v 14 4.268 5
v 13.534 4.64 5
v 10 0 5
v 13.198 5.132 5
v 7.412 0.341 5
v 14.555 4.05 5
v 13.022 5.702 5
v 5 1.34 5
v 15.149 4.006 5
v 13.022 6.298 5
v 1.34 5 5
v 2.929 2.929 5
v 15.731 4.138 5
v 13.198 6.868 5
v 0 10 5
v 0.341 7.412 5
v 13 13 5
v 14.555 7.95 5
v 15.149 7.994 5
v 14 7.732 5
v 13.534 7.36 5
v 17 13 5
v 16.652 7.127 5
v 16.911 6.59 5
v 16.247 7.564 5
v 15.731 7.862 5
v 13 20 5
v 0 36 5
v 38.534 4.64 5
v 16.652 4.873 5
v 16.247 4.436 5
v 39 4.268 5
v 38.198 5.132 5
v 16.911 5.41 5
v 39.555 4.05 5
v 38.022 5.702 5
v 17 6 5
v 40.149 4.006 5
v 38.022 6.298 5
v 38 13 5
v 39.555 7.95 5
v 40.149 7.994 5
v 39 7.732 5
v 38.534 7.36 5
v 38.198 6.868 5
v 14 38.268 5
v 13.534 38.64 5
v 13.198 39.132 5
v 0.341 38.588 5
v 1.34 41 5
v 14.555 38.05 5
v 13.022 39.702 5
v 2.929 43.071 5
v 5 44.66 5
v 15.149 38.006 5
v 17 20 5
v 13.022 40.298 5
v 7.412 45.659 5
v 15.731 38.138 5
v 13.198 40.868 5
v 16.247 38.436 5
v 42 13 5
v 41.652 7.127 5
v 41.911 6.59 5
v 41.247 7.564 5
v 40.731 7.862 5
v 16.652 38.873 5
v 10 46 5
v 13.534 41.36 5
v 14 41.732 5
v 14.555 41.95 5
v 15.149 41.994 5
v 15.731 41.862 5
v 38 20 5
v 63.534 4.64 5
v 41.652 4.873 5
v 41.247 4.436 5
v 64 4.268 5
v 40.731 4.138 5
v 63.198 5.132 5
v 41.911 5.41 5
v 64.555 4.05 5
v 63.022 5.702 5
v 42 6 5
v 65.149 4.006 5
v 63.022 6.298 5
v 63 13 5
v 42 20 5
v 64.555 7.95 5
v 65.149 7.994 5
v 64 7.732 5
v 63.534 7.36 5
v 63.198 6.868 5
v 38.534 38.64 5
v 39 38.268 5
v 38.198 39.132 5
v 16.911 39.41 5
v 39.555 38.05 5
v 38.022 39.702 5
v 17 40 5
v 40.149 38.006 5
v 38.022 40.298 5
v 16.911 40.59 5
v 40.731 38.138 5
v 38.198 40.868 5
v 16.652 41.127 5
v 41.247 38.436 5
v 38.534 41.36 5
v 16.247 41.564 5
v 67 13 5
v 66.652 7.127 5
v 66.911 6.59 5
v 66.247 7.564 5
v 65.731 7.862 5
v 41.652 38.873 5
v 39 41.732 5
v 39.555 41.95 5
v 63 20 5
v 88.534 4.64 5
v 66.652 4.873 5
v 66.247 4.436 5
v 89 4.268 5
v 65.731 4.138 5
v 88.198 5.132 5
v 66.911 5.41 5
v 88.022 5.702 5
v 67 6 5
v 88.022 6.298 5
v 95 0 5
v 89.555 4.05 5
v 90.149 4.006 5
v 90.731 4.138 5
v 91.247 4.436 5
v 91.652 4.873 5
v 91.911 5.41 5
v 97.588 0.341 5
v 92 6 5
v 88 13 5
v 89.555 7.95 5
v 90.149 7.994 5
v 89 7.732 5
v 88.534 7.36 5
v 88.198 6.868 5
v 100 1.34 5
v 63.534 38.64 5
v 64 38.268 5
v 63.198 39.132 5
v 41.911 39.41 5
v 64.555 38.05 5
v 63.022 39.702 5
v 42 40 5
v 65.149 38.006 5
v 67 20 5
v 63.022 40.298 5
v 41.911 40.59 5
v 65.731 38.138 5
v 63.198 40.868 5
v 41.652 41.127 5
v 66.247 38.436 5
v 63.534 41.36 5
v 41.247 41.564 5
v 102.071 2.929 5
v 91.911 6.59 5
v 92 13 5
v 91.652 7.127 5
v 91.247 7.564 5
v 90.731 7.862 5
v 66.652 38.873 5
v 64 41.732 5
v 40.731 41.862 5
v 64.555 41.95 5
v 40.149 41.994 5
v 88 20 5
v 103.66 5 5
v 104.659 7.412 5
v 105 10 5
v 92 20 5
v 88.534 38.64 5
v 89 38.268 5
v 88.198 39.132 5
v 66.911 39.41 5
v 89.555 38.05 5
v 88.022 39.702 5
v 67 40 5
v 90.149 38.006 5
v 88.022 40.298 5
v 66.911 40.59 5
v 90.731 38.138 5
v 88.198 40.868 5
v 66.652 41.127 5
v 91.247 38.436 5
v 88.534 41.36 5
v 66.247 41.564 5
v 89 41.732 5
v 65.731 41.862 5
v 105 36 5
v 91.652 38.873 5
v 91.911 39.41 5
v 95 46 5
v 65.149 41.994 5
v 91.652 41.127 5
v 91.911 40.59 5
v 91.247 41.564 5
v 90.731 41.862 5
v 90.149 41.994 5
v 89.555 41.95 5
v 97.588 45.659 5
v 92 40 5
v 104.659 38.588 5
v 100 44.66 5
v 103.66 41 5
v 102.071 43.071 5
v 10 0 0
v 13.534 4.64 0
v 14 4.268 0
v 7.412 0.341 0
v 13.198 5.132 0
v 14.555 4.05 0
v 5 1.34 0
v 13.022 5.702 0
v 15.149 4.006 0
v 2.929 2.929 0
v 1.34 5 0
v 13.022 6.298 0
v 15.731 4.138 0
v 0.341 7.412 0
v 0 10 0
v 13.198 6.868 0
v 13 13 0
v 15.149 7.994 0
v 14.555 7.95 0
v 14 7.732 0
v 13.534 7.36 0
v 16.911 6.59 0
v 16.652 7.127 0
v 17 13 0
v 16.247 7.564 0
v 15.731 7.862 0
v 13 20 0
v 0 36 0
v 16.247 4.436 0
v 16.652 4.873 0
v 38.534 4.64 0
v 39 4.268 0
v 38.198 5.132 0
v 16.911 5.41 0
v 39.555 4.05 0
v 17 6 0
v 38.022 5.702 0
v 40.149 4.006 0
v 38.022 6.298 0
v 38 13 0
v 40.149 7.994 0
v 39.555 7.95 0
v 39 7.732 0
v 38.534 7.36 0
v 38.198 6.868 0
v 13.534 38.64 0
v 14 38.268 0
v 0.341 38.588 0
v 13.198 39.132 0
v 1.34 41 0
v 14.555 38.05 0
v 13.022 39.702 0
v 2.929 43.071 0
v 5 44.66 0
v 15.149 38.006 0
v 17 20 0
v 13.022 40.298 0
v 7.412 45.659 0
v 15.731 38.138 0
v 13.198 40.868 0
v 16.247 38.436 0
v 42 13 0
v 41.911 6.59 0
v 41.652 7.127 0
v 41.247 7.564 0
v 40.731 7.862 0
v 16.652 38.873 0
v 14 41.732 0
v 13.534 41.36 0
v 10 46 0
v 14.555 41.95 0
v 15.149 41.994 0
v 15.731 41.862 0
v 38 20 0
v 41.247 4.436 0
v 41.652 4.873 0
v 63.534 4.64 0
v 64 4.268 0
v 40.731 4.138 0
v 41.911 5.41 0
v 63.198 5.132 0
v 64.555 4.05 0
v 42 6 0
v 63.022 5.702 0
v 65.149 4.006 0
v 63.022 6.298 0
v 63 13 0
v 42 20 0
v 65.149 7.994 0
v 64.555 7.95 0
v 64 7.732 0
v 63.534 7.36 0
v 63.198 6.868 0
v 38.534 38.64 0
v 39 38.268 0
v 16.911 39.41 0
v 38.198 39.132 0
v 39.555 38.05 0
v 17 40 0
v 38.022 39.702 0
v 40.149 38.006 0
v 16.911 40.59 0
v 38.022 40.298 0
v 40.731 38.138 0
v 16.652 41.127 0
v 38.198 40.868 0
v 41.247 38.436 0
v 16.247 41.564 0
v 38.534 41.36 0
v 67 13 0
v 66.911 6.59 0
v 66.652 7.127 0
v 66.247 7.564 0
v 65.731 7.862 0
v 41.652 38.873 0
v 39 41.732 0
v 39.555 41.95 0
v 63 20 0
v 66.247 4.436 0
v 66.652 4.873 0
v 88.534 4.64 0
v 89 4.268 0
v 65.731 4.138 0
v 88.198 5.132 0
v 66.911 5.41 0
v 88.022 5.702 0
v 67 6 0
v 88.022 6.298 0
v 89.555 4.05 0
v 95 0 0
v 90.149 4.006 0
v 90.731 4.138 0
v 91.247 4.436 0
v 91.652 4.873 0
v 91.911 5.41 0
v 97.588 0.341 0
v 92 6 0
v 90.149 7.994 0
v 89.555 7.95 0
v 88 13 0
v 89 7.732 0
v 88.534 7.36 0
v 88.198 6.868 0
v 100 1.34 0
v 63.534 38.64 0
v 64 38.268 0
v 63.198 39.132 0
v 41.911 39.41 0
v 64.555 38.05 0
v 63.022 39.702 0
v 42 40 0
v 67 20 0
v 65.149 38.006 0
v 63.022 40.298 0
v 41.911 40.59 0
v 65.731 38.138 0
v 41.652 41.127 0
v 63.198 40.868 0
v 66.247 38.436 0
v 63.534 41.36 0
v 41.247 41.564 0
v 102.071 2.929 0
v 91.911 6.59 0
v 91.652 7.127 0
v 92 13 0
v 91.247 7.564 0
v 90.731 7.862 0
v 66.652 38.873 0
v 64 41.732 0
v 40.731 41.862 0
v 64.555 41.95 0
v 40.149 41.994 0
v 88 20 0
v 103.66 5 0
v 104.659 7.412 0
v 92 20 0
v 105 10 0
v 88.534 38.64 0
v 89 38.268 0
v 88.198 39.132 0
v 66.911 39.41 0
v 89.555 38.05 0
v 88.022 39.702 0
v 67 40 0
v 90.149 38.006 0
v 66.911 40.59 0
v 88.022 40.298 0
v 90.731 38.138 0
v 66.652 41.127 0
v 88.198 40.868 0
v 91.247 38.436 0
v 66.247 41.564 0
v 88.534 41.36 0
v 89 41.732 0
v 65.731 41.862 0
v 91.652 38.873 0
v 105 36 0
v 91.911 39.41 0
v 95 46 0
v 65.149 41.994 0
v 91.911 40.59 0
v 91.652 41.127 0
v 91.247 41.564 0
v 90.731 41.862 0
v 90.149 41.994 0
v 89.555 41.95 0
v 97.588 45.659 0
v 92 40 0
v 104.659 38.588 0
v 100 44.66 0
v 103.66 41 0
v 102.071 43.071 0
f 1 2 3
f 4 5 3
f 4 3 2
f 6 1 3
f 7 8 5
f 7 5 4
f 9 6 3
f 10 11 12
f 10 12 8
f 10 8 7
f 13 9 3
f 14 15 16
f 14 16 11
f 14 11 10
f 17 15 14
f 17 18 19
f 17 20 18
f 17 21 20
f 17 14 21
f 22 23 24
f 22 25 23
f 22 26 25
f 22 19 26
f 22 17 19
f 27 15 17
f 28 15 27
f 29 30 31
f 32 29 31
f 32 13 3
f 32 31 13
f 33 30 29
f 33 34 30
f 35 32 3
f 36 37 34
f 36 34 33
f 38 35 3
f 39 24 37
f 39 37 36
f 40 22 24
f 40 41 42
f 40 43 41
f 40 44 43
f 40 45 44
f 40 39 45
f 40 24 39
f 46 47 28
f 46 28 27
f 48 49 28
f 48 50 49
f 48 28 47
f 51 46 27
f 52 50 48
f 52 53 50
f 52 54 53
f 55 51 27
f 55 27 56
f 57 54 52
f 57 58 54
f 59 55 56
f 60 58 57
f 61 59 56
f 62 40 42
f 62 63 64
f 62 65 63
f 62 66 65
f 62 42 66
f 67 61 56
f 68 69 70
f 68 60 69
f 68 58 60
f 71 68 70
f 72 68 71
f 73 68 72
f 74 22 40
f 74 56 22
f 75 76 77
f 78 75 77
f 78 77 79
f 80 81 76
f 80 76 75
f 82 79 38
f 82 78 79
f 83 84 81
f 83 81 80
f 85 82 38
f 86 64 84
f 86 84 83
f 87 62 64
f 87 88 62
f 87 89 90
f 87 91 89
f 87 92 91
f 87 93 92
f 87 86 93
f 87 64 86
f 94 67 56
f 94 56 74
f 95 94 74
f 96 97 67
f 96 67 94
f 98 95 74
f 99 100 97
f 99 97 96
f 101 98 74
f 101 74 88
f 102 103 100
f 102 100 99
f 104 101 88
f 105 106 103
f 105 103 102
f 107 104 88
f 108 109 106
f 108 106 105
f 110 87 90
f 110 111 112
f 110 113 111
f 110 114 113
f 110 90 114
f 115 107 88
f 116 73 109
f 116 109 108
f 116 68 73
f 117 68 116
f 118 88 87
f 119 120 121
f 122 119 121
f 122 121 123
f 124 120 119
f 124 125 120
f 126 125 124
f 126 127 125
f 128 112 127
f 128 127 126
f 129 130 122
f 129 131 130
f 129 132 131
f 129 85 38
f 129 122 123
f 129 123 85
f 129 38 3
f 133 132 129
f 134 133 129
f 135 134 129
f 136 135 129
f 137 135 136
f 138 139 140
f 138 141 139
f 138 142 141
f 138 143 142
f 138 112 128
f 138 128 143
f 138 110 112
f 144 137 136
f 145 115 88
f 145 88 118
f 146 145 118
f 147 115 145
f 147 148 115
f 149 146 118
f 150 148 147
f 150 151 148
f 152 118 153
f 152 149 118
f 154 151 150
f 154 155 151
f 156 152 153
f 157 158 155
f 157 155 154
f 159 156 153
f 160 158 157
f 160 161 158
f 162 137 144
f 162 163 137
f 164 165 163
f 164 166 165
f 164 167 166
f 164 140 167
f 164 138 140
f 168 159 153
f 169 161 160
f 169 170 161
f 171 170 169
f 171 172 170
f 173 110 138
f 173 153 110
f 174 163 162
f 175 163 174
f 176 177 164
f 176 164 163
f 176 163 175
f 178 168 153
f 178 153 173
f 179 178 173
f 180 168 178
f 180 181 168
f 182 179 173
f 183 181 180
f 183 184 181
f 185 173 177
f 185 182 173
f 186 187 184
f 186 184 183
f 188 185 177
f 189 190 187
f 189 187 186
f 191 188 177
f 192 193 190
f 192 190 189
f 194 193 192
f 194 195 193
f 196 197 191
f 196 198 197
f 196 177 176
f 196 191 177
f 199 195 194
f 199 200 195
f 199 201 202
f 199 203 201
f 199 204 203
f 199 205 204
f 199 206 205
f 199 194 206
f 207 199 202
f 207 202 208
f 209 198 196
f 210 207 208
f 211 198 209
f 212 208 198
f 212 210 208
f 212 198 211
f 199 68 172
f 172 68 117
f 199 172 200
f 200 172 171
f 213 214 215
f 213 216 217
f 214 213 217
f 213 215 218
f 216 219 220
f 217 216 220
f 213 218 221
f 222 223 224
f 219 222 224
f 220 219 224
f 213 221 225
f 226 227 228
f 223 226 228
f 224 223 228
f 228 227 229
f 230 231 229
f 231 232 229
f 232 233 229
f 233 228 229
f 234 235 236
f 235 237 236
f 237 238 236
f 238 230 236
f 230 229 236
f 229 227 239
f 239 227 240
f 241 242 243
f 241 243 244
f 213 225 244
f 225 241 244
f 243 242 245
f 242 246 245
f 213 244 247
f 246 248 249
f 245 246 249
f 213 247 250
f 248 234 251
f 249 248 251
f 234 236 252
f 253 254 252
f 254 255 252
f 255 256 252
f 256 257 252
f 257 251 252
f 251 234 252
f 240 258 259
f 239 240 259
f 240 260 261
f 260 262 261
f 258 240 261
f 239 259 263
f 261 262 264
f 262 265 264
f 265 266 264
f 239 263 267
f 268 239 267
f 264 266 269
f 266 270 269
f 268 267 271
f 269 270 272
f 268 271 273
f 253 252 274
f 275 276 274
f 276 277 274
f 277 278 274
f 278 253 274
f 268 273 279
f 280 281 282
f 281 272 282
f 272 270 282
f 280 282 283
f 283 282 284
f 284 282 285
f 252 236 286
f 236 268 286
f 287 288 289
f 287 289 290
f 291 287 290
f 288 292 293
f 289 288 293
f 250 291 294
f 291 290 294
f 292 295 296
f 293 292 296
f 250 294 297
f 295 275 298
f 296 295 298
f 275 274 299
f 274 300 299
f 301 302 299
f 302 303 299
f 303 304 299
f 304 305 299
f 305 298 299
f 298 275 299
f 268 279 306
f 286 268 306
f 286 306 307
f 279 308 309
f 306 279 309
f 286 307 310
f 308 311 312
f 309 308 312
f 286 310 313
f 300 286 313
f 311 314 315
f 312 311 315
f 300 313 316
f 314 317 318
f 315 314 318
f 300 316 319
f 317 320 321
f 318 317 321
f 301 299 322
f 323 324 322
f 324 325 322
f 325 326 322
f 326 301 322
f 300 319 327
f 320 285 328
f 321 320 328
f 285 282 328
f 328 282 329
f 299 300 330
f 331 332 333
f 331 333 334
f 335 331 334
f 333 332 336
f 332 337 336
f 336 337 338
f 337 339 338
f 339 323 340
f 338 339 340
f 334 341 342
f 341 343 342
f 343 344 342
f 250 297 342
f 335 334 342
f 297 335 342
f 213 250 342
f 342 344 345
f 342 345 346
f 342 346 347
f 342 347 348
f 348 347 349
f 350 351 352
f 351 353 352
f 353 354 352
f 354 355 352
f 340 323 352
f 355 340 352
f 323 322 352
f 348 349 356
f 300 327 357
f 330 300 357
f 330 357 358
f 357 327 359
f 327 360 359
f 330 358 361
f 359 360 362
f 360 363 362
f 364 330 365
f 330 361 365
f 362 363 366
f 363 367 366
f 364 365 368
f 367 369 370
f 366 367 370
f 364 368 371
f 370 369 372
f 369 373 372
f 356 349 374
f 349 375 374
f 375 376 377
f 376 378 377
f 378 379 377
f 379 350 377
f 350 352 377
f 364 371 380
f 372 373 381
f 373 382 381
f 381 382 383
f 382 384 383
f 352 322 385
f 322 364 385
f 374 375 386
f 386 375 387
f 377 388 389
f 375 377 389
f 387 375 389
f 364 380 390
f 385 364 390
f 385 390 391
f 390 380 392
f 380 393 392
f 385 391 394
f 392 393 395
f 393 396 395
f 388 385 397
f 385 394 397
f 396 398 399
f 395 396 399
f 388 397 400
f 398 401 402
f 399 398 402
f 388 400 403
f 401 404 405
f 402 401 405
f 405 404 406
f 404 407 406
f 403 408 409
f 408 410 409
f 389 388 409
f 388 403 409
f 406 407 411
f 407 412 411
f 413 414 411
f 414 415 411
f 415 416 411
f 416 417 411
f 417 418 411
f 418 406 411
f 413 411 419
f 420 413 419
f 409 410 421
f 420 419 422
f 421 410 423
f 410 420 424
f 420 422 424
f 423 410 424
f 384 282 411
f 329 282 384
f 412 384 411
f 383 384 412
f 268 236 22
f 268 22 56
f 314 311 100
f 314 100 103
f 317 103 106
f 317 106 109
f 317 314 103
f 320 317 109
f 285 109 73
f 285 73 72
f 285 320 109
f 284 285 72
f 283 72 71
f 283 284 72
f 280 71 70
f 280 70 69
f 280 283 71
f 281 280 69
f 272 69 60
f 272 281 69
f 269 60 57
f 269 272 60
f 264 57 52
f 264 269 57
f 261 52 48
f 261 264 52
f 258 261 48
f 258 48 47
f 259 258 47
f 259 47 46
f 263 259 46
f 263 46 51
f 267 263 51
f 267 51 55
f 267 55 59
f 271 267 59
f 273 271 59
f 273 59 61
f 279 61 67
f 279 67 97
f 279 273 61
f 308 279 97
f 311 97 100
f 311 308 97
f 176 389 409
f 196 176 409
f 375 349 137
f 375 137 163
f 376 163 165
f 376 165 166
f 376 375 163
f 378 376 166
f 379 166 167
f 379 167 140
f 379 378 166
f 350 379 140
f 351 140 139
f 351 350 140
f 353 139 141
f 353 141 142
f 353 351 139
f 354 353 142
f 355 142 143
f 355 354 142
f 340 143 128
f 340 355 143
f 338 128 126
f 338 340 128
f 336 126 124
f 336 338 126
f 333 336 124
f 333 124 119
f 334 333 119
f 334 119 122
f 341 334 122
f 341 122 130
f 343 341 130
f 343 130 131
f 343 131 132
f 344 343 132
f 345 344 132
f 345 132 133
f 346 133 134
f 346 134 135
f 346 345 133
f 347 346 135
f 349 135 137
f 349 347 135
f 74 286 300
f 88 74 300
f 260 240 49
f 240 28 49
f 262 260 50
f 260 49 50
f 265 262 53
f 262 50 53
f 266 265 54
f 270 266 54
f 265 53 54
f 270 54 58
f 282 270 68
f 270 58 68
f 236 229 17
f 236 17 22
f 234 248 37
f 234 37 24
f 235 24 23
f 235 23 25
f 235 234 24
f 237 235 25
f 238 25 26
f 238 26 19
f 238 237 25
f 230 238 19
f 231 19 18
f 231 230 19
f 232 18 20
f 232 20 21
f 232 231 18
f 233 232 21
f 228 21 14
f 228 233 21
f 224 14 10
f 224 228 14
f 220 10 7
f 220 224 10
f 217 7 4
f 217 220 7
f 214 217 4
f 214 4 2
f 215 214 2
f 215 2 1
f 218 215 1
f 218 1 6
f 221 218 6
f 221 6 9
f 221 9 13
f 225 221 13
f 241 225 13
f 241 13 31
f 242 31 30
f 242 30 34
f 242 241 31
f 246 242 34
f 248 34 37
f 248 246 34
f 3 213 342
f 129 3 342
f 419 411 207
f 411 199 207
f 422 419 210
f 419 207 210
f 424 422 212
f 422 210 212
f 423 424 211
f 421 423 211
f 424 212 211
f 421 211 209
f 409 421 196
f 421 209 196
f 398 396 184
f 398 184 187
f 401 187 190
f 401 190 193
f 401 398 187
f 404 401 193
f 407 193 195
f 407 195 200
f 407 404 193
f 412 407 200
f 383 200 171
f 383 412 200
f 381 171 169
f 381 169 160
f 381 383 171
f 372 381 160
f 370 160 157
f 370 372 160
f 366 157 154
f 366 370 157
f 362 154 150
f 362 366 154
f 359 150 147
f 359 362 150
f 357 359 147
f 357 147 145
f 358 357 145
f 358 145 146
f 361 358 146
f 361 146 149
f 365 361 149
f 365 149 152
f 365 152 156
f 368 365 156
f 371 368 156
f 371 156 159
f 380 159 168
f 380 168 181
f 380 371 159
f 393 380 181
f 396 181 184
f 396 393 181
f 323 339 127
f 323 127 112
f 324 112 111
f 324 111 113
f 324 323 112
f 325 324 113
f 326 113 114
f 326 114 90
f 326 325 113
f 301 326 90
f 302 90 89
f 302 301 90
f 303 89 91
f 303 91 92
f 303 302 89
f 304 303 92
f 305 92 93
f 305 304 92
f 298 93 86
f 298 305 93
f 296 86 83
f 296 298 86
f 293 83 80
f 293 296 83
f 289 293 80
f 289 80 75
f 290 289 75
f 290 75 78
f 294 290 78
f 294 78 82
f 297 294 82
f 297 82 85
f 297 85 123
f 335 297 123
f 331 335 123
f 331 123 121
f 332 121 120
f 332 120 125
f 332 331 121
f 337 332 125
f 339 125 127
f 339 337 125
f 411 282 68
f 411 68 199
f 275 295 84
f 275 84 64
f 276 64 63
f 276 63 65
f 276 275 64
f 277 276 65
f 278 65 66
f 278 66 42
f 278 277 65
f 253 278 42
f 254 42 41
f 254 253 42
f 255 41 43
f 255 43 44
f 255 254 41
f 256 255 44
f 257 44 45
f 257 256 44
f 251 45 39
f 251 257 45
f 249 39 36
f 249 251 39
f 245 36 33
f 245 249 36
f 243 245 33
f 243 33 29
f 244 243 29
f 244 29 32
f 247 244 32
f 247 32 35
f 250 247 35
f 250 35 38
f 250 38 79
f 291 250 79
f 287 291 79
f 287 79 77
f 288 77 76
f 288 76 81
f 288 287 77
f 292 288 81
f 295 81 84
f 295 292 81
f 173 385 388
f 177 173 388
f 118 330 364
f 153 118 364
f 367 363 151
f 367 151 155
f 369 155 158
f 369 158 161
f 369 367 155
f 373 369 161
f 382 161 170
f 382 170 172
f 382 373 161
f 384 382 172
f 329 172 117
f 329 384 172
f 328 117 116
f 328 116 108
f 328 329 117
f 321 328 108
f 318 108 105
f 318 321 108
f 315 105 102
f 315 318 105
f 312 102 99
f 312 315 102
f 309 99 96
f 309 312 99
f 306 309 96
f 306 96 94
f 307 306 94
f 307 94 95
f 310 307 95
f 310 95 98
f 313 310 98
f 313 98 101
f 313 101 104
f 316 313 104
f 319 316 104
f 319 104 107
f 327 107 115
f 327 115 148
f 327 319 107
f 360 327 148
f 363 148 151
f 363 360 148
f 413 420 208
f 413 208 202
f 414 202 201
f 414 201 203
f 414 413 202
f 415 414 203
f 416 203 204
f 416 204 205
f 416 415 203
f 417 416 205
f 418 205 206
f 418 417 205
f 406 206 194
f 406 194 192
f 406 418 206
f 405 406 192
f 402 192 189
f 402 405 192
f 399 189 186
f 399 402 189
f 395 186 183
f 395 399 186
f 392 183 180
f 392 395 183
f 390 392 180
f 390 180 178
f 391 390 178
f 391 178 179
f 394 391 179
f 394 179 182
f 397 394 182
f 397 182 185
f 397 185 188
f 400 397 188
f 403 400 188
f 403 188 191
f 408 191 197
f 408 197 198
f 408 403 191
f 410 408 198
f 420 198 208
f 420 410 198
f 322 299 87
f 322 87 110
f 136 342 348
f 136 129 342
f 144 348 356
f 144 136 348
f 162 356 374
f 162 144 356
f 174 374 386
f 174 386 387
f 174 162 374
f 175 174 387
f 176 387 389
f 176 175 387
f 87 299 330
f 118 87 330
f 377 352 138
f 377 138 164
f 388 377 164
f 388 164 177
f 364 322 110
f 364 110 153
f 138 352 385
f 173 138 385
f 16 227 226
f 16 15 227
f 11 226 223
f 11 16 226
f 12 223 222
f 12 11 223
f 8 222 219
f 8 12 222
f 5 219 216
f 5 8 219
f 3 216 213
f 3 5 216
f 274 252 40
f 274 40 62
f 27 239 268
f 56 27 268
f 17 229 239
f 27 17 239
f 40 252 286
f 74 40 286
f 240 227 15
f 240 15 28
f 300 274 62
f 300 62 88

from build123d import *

# Parameters (mm, degrees)
ESQUISSE1_W        = 105
ESQUISSE1_H        = 46
ESQUISSE1_R        = 2
ESQUISSE1_W_2      = 4
ESQUISSE1_H_2      = 7
BOSS_EXTRU_1_DEPTH = 5
CONG_1_R           = 10


with BuildPart() as part:
    # Esquisse1 → Boss.-Extru.1 (new body)
    with BuildSketch(Plane.XY):
        with Locations((52.5, 23)):
            Rectangle(ESQUISSE1_W, ESQUISSE1_H)
        with Locations((15, 6)):
            Circle(ESQUISSE1_R, mode=Mode.SUBTRACT)
        with Locations((15, 40)):
            Circle(ESQUISSE1_R, mode=Mode.SUBTRACT)
        with Locations((40, 40)):
            Circle(ESQUISSE1_R, mode=Mode.SUBTRACT)
        with Locations((40, 6)):
            Circle(ESQUISSE1_R, mode=Mode.SUBTRACT)
        with Locations((65, 40)):
            Circle(ESQUISSE1_R, mode=Mode.SUBTRACT)
        with Locations((65, 6)):
            Circle(ESQUISSE1_R, mode=Mode.SUBTRACT)
        with Locations((90, 40)):
            Circle(ESQUISSE1_R, mode=Mode.SUBTRACT)
        with Locations((90, 6)):
            Circle(ESQUISSE1_R, mode=Mode.SUBTRACT)
        with Locations((40, 16.5)):
            Rectangle(ESQUISSE1_W_2, ESQUISSE1_H_2, mode=Mode.SUBTRACT)
        with Locations((15, 16.5)):
            Rectangle(ESQUISSE1_W_2, ESQUISSE1_H_2, mode=Mode.SUBTRACT)
        with Locations((65, 16.5)):
            Rectangle(ESQUISSE1_W_2, ESQUISSE1_H_2, mode=Mode.SUBTRACT)
        with Locations((90, 16.5)):
            Rectangle(ESQUISSE1_W_2, ESQUISSE1_H_2, mode=Mode.SUBTRACT)
    extrude(amount=BOSS_EXTRU_1_DEPTH)

    # Congé1
    cong_1_edges = [part.edges().sort_by_distance(p)[0] for p in [
        (0, 46, 2.5),
        (105, 46, 2.5),
        (105, 0, 2.5),
        (0, 0, 2.5),
    ]]
    fillet(cong_1_edges, radius=CONG_1_R)


solid = part.part
